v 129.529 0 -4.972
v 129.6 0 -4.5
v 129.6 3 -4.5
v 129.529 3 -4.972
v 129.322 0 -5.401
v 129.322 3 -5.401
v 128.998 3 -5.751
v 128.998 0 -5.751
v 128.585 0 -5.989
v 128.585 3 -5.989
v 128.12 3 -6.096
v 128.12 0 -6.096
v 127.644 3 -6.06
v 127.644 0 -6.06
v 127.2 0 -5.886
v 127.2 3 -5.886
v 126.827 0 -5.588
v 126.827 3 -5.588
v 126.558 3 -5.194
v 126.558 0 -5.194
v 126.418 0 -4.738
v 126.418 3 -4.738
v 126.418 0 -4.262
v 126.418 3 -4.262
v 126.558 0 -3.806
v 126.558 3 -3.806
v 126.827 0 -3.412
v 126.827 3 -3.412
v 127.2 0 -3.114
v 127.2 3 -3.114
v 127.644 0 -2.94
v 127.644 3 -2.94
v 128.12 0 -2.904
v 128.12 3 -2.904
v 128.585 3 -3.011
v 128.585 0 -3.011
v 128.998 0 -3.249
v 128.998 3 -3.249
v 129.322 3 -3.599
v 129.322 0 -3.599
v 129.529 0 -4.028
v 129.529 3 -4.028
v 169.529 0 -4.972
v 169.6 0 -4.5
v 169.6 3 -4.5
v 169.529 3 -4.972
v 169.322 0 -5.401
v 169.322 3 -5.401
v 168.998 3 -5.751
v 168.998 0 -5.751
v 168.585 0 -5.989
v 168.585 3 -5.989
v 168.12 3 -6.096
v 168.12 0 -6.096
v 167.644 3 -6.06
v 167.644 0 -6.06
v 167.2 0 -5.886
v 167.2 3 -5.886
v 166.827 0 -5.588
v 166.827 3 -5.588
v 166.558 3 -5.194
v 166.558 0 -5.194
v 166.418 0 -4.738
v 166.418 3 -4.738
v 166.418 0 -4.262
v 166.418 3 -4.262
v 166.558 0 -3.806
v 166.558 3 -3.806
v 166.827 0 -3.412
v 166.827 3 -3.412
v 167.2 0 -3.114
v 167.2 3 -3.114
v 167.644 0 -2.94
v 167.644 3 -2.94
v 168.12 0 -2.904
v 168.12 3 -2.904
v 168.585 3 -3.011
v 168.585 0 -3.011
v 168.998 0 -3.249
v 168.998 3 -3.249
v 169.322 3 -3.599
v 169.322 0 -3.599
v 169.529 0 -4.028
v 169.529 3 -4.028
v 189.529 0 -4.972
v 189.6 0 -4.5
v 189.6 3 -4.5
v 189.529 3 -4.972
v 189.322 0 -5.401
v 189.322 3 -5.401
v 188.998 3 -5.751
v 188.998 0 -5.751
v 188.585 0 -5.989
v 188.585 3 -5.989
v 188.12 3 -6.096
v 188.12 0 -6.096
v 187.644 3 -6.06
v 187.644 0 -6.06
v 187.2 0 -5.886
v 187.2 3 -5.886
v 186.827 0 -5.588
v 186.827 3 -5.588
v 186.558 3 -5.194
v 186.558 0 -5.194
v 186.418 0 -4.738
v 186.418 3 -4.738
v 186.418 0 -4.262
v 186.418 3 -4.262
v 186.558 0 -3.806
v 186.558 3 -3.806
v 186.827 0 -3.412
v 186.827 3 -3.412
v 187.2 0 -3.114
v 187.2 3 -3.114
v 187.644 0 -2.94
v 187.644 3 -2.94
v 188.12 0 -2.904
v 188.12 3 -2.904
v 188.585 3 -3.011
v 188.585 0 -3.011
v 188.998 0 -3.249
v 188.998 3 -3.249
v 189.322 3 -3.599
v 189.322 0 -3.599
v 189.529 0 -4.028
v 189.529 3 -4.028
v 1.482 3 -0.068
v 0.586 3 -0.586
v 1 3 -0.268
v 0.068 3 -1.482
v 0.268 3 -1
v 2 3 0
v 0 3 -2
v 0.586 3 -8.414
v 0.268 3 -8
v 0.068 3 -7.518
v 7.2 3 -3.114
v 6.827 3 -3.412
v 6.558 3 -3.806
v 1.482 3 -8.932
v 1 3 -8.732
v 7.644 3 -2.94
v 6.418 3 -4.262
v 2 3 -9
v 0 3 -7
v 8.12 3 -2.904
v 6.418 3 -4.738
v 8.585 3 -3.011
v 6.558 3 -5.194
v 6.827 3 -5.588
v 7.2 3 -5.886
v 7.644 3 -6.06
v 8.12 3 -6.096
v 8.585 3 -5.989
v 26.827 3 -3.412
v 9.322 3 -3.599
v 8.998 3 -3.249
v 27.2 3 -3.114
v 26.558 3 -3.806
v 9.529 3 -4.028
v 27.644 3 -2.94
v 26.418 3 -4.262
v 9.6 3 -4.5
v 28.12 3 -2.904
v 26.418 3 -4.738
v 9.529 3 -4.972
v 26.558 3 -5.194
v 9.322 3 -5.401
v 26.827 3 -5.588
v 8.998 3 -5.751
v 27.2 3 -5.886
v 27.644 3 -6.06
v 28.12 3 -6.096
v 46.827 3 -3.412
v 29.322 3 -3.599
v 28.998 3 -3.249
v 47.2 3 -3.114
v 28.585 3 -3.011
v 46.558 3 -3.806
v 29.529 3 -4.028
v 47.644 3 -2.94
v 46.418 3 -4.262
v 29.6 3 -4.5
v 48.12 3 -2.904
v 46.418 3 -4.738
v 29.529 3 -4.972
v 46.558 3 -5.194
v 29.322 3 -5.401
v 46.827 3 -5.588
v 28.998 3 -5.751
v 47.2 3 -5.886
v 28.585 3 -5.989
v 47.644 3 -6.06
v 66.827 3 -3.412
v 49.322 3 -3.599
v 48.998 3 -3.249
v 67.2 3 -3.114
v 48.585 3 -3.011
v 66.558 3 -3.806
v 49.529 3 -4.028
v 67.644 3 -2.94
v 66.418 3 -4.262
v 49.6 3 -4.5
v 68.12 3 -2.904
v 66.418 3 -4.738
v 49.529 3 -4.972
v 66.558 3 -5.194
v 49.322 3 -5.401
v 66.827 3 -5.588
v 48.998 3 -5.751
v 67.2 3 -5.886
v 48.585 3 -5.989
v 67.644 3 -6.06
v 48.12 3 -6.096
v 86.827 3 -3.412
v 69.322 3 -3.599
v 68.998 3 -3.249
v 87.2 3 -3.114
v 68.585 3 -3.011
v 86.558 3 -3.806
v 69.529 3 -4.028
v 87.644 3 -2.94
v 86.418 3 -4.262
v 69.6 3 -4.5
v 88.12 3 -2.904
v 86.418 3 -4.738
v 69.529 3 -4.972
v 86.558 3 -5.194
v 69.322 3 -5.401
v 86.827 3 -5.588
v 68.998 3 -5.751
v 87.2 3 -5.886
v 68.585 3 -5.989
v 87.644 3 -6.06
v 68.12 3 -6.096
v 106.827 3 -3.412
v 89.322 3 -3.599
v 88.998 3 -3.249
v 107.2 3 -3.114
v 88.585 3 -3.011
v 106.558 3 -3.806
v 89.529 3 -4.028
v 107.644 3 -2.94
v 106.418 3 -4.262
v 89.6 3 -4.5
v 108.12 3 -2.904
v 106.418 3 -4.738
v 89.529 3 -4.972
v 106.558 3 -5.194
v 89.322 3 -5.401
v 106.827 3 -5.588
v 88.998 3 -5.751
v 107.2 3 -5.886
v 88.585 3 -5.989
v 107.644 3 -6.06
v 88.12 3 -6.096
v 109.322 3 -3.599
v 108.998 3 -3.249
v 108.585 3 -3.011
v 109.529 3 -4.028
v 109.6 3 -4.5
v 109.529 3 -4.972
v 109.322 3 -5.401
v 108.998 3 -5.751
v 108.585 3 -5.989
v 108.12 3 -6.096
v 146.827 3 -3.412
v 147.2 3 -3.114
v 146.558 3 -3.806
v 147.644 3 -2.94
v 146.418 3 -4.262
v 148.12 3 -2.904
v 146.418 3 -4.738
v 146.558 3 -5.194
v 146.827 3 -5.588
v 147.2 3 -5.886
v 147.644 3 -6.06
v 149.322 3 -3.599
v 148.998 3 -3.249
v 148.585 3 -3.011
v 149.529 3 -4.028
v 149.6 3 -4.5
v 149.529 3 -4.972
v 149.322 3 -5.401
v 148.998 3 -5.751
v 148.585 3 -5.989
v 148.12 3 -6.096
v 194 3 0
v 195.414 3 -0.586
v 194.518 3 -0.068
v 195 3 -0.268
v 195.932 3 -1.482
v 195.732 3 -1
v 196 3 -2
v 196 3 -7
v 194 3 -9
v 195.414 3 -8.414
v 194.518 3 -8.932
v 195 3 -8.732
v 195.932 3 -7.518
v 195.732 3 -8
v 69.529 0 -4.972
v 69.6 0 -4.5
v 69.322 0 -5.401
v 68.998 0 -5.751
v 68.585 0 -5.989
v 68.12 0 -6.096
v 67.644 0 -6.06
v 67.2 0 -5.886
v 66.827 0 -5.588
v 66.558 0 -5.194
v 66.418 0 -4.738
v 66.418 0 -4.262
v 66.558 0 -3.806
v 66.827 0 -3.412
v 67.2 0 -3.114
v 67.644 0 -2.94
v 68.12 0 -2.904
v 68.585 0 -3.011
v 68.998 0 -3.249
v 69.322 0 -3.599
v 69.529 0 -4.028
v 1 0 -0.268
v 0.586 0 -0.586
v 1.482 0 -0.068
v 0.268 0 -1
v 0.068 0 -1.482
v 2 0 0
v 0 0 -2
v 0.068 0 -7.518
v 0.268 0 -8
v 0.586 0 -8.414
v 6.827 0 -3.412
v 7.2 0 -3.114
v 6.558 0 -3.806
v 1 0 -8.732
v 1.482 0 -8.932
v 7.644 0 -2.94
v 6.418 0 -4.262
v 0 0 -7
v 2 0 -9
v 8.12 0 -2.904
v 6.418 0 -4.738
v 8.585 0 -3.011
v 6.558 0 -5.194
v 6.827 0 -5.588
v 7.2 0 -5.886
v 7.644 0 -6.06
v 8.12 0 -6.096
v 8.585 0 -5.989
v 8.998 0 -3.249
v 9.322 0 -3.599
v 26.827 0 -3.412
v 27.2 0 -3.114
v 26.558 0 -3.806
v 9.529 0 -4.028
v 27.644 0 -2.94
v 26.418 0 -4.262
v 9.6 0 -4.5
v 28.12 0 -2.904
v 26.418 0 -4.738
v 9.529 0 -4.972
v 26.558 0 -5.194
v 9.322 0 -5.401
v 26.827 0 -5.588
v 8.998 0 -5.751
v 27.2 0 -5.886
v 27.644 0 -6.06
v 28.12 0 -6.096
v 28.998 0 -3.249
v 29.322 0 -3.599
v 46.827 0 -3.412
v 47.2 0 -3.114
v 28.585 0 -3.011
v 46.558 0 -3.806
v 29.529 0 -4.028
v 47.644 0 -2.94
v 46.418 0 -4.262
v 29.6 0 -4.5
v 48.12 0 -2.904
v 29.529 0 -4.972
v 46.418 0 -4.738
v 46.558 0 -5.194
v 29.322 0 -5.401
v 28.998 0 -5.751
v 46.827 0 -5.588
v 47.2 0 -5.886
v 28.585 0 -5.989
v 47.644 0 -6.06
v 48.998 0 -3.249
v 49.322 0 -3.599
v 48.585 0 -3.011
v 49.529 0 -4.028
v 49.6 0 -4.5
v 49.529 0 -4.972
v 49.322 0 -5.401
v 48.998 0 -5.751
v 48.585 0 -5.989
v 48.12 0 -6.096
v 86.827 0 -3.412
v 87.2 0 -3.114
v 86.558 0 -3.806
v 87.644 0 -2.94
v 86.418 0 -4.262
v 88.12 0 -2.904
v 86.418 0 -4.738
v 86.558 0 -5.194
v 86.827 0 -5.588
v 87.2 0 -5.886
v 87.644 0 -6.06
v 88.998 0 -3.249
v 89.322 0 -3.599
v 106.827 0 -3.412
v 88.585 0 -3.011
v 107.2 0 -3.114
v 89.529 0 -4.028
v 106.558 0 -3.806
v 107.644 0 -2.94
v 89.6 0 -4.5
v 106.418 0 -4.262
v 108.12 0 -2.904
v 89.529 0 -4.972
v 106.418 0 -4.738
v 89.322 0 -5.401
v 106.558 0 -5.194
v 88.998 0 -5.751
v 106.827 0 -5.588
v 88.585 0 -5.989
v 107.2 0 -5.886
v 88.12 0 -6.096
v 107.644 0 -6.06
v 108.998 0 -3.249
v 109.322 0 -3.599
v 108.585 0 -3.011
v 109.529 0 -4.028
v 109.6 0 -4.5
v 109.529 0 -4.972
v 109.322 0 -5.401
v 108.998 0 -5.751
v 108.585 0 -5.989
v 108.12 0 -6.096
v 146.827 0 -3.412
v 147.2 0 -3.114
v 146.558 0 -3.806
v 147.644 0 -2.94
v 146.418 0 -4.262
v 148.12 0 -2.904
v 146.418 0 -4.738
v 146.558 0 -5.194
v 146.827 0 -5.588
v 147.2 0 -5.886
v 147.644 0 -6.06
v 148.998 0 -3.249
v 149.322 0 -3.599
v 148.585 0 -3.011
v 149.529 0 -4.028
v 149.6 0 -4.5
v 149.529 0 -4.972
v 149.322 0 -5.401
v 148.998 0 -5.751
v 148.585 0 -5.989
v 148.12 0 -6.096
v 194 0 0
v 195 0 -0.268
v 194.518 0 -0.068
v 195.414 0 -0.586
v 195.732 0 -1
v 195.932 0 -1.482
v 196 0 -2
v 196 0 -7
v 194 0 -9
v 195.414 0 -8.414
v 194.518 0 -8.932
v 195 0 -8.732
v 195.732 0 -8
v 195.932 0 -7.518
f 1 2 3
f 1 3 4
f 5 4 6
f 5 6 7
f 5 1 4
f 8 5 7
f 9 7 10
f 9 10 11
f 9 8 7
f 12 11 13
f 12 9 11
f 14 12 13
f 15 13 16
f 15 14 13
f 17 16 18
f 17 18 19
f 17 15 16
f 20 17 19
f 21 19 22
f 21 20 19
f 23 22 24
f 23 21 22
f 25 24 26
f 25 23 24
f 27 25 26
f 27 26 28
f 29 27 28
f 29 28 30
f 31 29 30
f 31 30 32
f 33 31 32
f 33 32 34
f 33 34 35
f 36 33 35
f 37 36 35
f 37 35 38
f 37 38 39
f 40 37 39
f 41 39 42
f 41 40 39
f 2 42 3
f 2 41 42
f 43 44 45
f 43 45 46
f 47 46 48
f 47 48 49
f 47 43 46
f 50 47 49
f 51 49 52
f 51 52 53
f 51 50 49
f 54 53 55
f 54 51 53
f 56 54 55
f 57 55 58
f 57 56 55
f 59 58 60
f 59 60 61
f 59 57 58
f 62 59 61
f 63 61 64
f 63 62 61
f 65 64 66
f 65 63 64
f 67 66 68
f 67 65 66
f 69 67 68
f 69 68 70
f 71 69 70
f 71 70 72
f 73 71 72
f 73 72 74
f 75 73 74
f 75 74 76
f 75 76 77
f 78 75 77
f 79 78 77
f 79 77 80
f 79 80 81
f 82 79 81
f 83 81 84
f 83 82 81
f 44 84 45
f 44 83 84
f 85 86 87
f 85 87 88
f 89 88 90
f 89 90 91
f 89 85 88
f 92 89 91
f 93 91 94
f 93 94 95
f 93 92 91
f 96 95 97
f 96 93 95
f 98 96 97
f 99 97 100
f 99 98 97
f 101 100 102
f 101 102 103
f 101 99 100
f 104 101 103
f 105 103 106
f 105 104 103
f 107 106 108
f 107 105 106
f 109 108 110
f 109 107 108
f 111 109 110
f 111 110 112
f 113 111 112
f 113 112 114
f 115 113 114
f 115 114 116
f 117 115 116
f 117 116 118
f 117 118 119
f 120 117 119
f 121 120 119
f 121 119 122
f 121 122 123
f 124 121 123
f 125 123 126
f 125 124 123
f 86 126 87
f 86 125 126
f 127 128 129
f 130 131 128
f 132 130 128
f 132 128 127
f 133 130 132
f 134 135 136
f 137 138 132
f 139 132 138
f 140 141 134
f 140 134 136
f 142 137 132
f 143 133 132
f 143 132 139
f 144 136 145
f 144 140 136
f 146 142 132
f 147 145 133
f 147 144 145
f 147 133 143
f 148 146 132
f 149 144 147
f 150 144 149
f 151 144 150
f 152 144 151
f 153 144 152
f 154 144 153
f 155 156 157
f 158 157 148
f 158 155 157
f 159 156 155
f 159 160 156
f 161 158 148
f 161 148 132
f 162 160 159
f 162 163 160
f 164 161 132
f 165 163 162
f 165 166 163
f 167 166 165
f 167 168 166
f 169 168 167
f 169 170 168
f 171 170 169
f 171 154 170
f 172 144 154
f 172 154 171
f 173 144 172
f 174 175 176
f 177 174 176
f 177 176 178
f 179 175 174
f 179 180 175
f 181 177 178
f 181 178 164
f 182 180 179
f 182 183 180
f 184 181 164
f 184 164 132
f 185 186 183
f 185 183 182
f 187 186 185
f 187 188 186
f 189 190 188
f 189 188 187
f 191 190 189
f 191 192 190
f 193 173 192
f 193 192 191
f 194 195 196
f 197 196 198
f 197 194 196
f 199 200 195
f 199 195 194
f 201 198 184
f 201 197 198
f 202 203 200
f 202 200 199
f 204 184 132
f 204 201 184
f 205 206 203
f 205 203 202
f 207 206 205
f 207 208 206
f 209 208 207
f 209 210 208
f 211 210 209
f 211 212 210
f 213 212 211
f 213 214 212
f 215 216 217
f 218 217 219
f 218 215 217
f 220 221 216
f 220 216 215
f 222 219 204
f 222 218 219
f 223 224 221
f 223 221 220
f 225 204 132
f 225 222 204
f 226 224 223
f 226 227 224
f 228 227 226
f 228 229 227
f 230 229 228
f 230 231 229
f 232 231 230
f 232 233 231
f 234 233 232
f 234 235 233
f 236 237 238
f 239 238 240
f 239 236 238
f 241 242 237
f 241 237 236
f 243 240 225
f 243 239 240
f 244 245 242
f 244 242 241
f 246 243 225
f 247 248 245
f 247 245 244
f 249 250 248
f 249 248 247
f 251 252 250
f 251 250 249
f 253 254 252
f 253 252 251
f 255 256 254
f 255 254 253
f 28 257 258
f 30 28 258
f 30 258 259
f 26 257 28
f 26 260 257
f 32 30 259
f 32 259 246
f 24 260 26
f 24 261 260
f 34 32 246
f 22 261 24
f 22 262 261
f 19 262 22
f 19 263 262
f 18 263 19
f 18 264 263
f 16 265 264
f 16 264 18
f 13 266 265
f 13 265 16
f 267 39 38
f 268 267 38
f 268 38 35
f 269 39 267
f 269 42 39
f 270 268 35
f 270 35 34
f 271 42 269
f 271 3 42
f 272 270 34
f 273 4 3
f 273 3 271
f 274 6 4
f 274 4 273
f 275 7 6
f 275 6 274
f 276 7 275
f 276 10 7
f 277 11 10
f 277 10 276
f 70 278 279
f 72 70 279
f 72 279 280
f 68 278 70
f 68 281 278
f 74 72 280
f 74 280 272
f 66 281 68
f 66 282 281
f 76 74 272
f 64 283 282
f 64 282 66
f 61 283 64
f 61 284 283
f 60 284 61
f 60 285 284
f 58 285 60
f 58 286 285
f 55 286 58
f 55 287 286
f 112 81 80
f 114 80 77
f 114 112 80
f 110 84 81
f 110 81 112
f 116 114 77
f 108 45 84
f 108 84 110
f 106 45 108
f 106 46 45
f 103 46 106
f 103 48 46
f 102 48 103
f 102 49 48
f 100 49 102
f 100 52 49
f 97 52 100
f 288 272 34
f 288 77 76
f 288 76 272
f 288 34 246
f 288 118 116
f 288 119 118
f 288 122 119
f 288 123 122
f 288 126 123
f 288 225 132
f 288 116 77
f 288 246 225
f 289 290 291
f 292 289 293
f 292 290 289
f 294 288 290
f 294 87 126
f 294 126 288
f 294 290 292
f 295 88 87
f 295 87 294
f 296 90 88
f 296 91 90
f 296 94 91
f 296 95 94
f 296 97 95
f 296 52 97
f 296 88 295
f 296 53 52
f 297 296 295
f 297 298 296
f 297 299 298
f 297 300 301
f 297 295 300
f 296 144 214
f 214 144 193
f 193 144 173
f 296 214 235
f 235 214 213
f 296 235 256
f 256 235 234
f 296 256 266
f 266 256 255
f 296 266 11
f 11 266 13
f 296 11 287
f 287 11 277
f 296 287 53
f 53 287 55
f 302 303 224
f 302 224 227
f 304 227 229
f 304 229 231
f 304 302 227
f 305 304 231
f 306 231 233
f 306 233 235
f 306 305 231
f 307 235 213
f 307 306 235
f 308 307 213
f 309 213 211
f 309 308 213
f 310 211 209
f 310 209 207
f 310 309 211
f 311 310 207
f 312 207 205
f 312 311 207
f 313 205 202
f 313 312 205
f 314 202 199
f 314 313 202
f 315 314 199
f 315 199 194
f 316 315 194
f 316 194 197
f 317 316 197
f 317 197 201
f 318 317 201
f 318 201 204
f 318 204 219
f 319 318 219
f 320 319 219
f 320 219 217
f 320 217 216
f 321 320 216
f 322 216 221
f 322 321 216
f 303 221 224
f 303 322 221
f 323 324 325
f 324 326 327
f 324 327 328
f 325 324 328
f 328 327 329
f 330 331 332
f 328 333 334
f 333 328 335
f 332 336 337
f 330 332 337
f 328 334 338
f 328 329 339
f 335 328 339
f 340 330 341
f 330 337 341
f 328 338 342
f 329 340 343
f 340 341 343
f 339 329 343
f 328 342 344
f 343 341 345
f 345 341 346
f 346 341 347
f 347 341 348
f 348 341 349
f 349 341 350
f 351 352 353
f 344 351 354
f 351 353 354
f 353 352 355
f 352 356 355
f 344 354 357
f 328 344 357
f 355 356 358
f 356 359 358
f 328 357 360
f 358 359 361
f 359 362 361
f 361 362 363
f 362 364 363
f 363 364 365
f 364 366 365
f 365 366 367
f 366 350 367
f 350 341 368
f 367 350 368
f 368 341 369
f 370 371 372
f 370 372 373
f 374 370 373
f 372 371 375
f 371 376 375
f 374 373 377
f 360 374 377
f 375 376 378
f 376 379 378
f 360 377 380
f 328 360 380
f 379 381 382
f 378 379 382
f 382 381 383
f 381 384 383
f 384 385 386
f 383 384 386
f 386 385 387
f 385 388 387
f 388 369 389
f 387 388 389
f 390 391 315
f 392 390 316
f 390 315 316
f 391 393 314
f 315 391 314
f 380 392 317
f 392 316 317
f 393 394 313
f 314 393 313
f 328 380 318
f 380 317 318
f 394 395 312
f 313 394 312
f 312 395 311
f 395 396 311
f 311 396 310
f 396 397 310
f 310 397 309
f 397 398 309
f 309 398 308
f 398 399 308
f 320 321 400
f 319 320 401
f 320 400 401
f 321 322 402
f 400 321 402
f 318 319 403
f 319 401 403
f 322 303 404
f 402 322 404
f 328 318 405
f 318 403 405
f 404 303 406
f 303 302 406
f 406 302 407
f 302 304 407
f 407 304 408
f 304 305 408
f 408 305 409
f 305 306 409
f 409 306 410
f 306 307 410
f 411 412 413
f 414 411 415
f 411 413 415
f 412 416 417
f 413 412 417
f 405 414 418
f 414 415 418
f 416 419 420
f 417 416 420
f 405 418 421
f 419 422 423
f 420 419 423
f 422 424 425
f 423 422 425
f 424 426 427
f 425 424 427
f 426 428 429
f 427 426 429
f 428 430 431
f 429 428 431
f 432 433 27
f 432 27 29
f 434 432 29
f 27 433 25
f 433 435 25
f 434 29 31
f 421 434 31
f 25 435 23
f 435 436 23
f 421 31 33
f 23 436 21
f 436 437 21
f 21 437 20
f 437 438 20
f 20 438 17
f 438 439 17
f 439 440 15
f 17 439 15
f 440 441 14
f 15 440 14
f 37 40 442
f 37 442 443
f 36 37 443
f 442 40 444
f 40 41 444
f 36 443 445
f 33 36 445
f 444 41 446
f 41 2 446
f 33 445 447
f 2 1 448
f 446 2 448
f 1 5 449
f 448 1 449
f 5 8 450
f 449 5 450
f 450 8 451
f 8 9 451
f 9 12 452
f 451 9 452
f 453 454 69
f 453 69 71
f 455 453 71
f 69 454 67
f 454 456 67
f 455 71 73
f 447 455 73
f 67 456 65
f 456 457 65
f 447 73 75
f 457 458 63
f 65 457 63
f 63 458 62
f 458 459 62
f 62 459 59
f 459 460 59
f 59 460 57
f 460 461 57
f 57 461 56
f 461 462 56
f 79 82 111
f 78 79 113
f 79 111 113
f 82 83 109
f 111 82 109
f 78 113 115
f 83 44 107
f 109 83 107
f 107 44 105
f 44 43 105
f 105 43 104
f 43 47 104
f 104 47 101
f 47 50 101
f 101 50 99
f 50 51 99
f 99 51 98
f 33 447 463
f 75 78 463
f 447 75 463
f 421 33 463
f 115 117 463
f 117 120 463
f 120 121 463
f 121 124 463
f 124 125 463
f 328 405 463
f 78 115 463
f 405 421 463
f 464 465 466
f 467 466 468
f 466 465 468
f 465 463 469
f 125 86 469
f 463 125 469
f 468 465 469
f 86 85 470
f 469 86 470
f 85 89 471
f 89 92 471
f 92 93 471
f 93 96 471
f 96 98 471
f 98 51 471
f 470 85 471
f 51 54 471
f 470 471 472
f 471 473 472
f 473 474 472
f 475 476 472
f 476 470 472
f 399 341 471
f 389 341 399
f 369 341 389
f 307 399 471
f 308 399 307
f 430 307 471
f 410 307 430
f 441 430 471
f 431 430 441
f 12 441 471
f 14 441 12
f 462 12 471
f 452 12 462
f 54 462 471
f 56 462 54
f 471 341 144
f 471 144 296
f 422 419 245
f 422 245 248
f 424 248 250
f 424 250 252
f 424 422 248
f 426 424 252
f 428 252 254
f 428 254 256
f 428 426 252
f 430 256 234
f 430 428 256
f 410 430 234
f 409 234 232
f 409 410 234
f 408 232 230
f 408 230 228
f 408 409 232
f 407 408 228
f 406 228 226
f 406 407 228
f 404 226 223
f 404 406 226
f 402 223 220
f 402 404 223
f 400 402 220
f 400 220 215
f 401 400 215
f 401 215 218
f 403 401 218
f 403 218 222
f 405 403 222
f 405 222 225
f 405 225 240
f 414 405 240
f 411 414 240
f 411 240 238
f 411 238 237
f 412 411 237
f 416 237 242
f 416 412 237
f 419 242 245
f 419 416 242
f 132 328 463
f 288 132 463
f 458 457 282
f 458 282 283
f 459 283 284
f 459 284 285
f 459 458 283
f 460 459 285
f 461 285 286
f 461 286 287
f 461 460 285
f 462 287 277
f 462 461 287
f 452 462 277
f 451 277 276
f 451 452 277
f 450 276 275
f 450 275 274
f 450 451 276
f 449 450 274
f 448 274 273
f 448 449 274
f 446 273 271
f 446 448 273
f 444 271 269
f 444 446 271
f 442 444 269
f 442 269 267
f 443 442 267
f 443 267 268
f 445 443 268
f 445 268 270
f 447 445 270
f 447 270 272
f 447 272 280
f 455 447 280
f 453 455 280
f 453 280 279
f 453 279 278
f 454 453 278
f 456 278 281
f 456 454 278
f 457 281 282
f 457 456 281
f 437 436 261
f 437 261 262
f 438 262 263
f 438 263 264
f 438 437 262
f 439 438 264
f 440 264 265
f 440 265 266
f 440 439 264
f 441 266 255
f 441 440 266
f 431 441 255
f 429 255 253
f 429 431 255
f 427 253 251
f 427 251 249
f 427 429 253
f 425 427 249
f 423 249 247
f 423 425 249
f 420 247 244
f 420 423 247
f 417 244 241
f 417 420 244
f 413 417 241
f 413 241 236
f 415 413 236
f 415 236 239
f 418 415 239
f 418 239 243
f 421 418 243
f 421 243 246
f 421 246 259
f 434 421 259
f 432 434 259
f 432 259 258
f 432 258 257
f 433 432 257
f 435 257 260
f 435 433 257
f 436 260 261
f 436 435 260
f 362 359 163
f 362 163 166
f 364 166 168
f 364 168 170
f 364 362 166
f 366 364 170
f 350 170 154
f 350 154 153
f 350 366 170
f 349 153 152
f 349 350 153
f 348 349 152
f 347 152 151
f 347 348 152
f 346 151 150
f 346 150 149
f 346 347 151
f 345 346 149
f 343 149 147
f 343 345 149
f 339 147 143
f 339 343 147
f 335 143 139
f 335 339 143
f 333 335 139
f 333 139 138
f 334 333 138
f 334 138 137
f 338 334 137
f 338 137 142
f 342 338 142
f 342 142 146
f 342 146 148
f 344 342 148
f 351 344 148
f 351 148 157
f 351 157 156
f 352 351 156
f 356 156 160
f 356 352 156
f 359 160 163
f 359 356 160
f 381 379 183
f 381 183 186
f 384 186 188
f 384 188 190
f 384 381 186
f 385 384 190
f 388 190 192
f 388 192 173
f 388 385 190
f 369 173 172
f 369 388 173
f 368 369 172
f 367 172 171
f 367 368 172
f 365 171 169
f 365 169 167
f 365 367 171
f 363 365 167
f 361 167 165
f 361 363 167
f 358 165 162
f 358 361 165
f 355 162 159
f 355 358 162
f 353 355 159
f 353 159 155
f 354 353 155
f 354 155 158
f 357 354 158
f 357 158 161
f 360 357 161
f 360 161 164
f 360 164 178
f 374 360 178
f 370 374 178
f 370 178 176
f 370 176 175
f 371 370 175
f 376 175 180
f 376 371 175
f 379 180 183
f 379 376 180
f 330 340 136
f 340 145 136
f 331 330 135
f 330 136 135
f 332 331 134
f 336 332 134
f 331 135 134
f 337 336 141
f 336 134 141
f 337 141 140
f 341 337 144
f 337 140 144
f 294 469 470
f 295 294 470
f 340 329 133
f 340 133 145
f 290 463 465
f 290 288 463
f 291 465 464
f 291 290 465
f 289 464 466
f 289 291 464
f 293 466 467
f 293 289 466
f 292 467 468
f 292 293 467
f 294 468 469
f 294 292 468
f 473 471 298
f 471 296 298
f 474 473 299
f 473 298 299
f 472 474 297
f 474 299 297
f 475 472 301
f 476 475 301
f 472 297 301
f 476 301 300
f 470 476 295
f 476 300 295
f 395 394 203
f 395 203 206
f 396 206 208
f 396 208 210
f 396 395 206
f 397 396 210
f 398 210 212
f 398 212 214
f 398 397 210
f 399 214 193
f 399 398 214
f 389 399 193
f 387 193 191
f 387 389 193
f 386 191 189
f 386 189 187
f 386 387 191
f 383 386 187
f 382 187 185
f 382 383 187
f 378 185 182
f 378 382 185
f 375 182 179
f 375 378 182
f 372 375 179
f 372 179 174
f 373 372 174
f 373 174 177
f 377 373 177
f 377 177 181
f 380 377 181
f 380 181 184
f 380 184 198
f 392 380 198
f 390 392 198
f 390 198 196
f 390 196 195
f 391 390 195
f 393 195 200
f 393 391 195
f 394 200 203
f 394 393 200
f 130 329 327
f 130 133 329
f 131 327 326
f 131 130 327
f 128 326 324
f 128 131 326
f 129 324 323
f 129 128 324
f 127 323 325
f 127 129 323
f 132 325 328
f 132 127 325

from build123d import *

# Parameters (mm, degrees)
SKETCH_1_W      = 196
SKETCH_1_H      = 9
SKETCH_1_R      = 1.6
EXTRUDE_1_DEPTH = 3
FILLET_1_R      = 2


with BuildPart() as part:
    # 草图1 → 凸台-拉伸1 (new body)
    with BuildSketch(Plane(origin=(0, 0, 0), x_dir=(1, 0, 0), z_dir=(0, 1, 0))):
        with Locations((98, 4.5)):
            Rectangle(SKETCH_1_W, SKETCH_1_H)
        with Locations((8, 4.5)):
            Circle(SKETCH_1_R, mode=Mode.SUBTRACT)
        with Locations((28, 4.5)):
            Circle(SKETCH_1_R, mode=Mode.SUBTRACT)
        with Locations((48, 4.5)):
            Circle(SKETCH_1_R, mode=Mode.SUBTRACT)
        with Locations((68, 4.5)):
            Circle(SKETCH_1_R, mode=Mode.SUBTRACT)
        with Locations((88, 4.5)):
            Circle(SKETCH_1_R, mode=Mode.SUBTRACT)
        with Locations((108, 4.5)):
            Circle(SKETCH_1_R, mode=Mode.SUBTRACT)
        with Locations((128, 4.5)):
            Circle(SKETCH_1_R, mode=Mode.SUBTRACT)
        with Locations((148, 4.5)):
            Circle(SKETCH_1_R, mode=Mode.SUBTRACT)
        with Locations((168, 4.5)):
            Circle(SKETCH_1_R, mode=Mode.SUBTRACT)
        with Locations((188, 4.5)):
            Circle(SKETCH_1_R, mode=Mode.SUBTRACT)
    extrude(amount=EXTRUDE_1_DEPTH)

    # 圆角1
    fillet_1_edges = [part.edges().sort_by_distance(p)[0] for p in [
        (0, 1.5, -9),
        (196, 1.5, -9),
        (196, 1.5, 0),
        (0, 1.5, 0),
    ]]
    fillet(fillet_1_edges, radius=FILLET_1_R)


solid = part.part
